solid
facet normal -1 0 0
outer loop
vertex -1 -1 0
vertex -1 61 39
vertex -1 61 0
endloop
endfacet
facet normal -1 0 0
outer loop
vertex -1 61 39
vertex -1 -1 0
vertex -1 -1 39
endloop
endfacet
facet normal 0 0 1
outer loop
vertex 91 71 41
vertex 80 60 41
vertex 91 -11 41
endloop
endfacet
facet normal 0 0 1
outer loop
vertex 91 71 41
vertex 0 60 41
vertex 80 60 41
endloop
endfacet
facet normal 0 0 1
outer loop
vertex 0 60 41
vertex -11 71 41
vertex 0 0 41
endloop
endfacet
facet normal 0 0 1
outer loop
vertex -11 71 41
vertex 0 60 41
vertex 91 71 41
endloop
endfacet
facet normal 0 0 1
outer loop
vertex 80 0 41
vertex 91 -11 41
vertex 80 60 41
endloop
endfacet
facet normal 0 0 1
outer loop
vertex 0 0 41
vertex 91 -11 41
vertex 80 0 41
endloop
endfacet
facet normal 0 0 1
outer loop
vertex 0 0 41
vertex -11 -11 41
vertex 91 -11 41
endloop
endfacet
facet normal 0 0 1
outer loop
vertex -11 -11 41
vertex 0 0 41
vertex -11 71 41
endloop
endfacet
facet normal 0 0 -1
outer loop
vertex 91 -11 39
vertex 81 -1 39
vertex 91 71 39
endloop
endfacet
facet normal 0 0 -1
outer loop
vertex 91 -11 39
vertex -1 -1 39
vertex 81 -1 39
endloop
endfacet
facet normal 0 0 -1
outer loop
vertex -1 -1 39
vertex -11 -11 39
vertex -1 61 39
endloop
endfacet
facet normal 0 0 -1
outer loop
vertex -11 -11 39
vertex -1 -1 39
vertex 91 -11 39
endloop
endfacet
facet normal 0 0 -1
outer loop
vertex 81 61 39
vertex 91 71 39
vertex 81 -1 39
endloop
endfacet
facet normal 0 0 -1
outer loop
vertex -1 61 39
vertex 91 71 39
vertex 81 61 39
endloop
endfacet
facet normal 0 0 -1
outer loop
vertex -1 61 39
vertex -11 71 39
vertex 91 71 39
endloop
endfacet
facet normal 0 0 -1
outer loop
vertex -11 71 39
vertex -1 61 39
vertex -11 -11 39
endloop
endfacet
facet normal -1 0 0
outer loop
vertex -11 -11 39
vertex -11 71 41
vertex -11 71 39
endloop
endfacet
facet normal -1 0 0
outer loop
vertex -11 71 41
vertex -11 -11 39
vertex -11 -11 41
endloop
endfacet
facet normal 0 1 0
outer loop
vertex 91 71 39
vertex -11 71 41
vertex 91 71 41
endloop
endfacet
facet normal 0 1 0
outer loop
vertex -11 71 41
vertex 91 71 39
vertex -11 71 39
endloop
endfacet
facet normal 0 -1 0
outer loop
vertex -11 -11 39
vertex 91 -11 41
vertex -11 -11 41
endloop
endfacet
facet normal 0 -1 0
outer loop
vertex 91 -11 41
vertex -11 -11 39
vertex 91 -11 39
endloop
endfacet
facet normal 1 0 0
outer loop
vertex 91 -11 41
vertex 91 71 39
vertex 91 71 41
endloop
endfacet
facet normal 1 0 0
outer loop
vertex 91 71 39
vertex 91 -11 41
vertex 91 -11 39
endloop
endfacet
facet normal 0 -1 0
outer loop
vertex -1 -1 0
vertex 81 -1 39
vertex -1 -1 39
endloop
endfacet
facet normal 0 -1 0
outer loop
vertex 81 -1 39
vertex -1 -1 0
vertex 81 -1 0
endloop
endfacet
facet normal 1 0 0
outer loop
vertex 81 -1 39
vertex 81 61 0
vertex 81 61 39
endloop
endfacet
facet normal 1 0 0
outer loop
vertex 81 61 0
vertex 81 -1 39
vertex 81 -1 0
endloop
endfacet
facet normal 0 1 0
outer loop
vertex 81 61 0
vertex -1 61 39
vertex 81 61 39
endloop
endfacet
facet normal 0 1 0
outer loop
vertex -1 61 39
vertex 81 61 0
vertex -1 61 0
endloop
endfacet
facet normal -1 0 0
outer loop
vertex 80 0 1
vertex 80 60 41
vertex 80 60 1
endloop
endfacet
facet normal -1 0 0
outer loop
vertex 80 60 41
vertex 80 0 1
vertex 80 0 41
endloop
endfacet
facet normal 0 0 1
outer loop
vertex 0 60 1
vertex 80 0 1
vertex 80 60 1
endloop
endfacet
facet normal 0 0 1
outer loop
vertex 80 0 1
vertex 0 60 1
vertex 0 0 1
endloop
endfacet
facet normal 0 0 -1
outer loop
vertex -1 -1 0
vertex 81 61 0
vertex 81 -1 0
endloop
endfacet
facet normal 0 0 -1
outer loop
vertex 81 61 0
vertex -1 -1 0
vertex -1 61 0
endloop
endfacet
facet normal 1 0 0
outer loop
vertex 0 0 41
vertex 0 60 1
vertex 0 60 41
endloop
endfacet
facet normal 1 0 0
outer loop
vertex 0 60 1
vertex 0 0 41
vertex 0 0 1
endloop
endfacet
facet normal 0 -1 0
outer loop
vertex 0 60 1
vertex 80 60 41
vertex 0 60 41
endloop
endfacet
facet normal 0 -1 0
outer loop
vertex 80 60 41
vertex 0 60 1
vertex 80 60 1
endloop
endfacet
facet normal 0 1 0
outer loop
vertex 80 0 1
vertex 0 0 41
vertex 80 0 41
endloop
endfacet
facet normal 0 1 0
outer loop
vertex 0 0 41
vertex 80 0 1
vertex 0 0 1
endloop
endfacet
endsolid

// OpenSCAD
insideBoxMinX=80;
insideBoxMinY=60;
insideBoxMinZ=40;

insideBoxX1=insideBoxMinX+0;
insideBoxY1=insideBoxMinY+0;
insideBoxZ1=insideBoxMinZ+0;

boxWallsThickness1=1;
boxSealingLipWidth=10;

module fixationPillar(pillarWidth=5,pillarHeight=insideBoxMinZ,pillarScrewRadius=3/2)
{
    difference()
    {
    cube([pillarWidth,pillarWidth,pillarHeight]);
        translate([pillarWidth/2,pillarWidth/2,1])
        cylinder(r=pillarScrewRadius,h=pillarHeight,$fn=12);
    } 
}

module topOpenedBox(insideBoxX=insideBoxX1,insideBoxY=insideBoxY1,insideBoxZ=insideBoxZ1,boxWallsThickness=boxWallsThickness1)
{
//bottom plate
cube([insideBoxX,insideBoxY,boxWallsThickness]);


//back plate
translate([-boxWallsThickness,-boxWallsThickness,0])
cube([boxWallsThickness,insideBoxY+boxWallsThickness*2,insideBoxZ+boxWallsThickness]);

//front plate
translate([insideBoxX,-boxWallsThickness,0])
cube([boxWallsThickness,insideBoxY+boxWallsThickness*2,insideBoxZ+boxWallsThickness]);

//left plate
translate([0,-boxWallsThickness,0])
cube([insideBoxX,boxWallsThickness,insideBoxZ+boxWallsThickness]);

//Right plate
translate([0,insideBoxY,0])
cube([insideBoxX,boxWallsThickness,insideBoxZ+boxWallsThickness]);
}

module sealingLidShape(insideBoxX=insideBoxX1,insideBoxY=insideBoxY1,insideBoxZ=insideBoxZ1,boxWallsThickness=boxWallsThickness1,lipWidth=10,lipThickness=2,nbHolesX,nbHolesY,holesRadius=3/2)
{
    translate([0,0,insideBoxZ+boxWallsThickness-lipThickness])
    {
        
        //back
        translate([-lipWidth-boxWallsThickness,-lipWidth-boxWallsThickness,0])
        cube([lipWidth,insideBoxY+lipWidth*2+boxWallsThickness*2,lipThickness]);
        
        //left
        translate([-lipWidth-boxWallsThickness,-lipWidth-boxWallsThickness,0])
        cube([insideBoxX+lipWidth*2+boxWallsThickness*2,lipWidth,lipThickness]);
        
        //front
        translate([insideBoxX1+boxWallsThickness,-lipWidth-boxWallsThickness,0])
        cube([lipWidth,insideBoxY+lipWidth*2+boxWallsThickness*2,lipThickness]);
        
        //right
        translate([-lipWidth-boxWallsThickness,insideBoxY+boxWallsThickness,0])
        cube([insideBoxX+lipWidth*2+boxWallsThickness*2,lipWidth,lipThickness]);
        
        
    } 
}



sealingLidShape();
topOpenedBox();
